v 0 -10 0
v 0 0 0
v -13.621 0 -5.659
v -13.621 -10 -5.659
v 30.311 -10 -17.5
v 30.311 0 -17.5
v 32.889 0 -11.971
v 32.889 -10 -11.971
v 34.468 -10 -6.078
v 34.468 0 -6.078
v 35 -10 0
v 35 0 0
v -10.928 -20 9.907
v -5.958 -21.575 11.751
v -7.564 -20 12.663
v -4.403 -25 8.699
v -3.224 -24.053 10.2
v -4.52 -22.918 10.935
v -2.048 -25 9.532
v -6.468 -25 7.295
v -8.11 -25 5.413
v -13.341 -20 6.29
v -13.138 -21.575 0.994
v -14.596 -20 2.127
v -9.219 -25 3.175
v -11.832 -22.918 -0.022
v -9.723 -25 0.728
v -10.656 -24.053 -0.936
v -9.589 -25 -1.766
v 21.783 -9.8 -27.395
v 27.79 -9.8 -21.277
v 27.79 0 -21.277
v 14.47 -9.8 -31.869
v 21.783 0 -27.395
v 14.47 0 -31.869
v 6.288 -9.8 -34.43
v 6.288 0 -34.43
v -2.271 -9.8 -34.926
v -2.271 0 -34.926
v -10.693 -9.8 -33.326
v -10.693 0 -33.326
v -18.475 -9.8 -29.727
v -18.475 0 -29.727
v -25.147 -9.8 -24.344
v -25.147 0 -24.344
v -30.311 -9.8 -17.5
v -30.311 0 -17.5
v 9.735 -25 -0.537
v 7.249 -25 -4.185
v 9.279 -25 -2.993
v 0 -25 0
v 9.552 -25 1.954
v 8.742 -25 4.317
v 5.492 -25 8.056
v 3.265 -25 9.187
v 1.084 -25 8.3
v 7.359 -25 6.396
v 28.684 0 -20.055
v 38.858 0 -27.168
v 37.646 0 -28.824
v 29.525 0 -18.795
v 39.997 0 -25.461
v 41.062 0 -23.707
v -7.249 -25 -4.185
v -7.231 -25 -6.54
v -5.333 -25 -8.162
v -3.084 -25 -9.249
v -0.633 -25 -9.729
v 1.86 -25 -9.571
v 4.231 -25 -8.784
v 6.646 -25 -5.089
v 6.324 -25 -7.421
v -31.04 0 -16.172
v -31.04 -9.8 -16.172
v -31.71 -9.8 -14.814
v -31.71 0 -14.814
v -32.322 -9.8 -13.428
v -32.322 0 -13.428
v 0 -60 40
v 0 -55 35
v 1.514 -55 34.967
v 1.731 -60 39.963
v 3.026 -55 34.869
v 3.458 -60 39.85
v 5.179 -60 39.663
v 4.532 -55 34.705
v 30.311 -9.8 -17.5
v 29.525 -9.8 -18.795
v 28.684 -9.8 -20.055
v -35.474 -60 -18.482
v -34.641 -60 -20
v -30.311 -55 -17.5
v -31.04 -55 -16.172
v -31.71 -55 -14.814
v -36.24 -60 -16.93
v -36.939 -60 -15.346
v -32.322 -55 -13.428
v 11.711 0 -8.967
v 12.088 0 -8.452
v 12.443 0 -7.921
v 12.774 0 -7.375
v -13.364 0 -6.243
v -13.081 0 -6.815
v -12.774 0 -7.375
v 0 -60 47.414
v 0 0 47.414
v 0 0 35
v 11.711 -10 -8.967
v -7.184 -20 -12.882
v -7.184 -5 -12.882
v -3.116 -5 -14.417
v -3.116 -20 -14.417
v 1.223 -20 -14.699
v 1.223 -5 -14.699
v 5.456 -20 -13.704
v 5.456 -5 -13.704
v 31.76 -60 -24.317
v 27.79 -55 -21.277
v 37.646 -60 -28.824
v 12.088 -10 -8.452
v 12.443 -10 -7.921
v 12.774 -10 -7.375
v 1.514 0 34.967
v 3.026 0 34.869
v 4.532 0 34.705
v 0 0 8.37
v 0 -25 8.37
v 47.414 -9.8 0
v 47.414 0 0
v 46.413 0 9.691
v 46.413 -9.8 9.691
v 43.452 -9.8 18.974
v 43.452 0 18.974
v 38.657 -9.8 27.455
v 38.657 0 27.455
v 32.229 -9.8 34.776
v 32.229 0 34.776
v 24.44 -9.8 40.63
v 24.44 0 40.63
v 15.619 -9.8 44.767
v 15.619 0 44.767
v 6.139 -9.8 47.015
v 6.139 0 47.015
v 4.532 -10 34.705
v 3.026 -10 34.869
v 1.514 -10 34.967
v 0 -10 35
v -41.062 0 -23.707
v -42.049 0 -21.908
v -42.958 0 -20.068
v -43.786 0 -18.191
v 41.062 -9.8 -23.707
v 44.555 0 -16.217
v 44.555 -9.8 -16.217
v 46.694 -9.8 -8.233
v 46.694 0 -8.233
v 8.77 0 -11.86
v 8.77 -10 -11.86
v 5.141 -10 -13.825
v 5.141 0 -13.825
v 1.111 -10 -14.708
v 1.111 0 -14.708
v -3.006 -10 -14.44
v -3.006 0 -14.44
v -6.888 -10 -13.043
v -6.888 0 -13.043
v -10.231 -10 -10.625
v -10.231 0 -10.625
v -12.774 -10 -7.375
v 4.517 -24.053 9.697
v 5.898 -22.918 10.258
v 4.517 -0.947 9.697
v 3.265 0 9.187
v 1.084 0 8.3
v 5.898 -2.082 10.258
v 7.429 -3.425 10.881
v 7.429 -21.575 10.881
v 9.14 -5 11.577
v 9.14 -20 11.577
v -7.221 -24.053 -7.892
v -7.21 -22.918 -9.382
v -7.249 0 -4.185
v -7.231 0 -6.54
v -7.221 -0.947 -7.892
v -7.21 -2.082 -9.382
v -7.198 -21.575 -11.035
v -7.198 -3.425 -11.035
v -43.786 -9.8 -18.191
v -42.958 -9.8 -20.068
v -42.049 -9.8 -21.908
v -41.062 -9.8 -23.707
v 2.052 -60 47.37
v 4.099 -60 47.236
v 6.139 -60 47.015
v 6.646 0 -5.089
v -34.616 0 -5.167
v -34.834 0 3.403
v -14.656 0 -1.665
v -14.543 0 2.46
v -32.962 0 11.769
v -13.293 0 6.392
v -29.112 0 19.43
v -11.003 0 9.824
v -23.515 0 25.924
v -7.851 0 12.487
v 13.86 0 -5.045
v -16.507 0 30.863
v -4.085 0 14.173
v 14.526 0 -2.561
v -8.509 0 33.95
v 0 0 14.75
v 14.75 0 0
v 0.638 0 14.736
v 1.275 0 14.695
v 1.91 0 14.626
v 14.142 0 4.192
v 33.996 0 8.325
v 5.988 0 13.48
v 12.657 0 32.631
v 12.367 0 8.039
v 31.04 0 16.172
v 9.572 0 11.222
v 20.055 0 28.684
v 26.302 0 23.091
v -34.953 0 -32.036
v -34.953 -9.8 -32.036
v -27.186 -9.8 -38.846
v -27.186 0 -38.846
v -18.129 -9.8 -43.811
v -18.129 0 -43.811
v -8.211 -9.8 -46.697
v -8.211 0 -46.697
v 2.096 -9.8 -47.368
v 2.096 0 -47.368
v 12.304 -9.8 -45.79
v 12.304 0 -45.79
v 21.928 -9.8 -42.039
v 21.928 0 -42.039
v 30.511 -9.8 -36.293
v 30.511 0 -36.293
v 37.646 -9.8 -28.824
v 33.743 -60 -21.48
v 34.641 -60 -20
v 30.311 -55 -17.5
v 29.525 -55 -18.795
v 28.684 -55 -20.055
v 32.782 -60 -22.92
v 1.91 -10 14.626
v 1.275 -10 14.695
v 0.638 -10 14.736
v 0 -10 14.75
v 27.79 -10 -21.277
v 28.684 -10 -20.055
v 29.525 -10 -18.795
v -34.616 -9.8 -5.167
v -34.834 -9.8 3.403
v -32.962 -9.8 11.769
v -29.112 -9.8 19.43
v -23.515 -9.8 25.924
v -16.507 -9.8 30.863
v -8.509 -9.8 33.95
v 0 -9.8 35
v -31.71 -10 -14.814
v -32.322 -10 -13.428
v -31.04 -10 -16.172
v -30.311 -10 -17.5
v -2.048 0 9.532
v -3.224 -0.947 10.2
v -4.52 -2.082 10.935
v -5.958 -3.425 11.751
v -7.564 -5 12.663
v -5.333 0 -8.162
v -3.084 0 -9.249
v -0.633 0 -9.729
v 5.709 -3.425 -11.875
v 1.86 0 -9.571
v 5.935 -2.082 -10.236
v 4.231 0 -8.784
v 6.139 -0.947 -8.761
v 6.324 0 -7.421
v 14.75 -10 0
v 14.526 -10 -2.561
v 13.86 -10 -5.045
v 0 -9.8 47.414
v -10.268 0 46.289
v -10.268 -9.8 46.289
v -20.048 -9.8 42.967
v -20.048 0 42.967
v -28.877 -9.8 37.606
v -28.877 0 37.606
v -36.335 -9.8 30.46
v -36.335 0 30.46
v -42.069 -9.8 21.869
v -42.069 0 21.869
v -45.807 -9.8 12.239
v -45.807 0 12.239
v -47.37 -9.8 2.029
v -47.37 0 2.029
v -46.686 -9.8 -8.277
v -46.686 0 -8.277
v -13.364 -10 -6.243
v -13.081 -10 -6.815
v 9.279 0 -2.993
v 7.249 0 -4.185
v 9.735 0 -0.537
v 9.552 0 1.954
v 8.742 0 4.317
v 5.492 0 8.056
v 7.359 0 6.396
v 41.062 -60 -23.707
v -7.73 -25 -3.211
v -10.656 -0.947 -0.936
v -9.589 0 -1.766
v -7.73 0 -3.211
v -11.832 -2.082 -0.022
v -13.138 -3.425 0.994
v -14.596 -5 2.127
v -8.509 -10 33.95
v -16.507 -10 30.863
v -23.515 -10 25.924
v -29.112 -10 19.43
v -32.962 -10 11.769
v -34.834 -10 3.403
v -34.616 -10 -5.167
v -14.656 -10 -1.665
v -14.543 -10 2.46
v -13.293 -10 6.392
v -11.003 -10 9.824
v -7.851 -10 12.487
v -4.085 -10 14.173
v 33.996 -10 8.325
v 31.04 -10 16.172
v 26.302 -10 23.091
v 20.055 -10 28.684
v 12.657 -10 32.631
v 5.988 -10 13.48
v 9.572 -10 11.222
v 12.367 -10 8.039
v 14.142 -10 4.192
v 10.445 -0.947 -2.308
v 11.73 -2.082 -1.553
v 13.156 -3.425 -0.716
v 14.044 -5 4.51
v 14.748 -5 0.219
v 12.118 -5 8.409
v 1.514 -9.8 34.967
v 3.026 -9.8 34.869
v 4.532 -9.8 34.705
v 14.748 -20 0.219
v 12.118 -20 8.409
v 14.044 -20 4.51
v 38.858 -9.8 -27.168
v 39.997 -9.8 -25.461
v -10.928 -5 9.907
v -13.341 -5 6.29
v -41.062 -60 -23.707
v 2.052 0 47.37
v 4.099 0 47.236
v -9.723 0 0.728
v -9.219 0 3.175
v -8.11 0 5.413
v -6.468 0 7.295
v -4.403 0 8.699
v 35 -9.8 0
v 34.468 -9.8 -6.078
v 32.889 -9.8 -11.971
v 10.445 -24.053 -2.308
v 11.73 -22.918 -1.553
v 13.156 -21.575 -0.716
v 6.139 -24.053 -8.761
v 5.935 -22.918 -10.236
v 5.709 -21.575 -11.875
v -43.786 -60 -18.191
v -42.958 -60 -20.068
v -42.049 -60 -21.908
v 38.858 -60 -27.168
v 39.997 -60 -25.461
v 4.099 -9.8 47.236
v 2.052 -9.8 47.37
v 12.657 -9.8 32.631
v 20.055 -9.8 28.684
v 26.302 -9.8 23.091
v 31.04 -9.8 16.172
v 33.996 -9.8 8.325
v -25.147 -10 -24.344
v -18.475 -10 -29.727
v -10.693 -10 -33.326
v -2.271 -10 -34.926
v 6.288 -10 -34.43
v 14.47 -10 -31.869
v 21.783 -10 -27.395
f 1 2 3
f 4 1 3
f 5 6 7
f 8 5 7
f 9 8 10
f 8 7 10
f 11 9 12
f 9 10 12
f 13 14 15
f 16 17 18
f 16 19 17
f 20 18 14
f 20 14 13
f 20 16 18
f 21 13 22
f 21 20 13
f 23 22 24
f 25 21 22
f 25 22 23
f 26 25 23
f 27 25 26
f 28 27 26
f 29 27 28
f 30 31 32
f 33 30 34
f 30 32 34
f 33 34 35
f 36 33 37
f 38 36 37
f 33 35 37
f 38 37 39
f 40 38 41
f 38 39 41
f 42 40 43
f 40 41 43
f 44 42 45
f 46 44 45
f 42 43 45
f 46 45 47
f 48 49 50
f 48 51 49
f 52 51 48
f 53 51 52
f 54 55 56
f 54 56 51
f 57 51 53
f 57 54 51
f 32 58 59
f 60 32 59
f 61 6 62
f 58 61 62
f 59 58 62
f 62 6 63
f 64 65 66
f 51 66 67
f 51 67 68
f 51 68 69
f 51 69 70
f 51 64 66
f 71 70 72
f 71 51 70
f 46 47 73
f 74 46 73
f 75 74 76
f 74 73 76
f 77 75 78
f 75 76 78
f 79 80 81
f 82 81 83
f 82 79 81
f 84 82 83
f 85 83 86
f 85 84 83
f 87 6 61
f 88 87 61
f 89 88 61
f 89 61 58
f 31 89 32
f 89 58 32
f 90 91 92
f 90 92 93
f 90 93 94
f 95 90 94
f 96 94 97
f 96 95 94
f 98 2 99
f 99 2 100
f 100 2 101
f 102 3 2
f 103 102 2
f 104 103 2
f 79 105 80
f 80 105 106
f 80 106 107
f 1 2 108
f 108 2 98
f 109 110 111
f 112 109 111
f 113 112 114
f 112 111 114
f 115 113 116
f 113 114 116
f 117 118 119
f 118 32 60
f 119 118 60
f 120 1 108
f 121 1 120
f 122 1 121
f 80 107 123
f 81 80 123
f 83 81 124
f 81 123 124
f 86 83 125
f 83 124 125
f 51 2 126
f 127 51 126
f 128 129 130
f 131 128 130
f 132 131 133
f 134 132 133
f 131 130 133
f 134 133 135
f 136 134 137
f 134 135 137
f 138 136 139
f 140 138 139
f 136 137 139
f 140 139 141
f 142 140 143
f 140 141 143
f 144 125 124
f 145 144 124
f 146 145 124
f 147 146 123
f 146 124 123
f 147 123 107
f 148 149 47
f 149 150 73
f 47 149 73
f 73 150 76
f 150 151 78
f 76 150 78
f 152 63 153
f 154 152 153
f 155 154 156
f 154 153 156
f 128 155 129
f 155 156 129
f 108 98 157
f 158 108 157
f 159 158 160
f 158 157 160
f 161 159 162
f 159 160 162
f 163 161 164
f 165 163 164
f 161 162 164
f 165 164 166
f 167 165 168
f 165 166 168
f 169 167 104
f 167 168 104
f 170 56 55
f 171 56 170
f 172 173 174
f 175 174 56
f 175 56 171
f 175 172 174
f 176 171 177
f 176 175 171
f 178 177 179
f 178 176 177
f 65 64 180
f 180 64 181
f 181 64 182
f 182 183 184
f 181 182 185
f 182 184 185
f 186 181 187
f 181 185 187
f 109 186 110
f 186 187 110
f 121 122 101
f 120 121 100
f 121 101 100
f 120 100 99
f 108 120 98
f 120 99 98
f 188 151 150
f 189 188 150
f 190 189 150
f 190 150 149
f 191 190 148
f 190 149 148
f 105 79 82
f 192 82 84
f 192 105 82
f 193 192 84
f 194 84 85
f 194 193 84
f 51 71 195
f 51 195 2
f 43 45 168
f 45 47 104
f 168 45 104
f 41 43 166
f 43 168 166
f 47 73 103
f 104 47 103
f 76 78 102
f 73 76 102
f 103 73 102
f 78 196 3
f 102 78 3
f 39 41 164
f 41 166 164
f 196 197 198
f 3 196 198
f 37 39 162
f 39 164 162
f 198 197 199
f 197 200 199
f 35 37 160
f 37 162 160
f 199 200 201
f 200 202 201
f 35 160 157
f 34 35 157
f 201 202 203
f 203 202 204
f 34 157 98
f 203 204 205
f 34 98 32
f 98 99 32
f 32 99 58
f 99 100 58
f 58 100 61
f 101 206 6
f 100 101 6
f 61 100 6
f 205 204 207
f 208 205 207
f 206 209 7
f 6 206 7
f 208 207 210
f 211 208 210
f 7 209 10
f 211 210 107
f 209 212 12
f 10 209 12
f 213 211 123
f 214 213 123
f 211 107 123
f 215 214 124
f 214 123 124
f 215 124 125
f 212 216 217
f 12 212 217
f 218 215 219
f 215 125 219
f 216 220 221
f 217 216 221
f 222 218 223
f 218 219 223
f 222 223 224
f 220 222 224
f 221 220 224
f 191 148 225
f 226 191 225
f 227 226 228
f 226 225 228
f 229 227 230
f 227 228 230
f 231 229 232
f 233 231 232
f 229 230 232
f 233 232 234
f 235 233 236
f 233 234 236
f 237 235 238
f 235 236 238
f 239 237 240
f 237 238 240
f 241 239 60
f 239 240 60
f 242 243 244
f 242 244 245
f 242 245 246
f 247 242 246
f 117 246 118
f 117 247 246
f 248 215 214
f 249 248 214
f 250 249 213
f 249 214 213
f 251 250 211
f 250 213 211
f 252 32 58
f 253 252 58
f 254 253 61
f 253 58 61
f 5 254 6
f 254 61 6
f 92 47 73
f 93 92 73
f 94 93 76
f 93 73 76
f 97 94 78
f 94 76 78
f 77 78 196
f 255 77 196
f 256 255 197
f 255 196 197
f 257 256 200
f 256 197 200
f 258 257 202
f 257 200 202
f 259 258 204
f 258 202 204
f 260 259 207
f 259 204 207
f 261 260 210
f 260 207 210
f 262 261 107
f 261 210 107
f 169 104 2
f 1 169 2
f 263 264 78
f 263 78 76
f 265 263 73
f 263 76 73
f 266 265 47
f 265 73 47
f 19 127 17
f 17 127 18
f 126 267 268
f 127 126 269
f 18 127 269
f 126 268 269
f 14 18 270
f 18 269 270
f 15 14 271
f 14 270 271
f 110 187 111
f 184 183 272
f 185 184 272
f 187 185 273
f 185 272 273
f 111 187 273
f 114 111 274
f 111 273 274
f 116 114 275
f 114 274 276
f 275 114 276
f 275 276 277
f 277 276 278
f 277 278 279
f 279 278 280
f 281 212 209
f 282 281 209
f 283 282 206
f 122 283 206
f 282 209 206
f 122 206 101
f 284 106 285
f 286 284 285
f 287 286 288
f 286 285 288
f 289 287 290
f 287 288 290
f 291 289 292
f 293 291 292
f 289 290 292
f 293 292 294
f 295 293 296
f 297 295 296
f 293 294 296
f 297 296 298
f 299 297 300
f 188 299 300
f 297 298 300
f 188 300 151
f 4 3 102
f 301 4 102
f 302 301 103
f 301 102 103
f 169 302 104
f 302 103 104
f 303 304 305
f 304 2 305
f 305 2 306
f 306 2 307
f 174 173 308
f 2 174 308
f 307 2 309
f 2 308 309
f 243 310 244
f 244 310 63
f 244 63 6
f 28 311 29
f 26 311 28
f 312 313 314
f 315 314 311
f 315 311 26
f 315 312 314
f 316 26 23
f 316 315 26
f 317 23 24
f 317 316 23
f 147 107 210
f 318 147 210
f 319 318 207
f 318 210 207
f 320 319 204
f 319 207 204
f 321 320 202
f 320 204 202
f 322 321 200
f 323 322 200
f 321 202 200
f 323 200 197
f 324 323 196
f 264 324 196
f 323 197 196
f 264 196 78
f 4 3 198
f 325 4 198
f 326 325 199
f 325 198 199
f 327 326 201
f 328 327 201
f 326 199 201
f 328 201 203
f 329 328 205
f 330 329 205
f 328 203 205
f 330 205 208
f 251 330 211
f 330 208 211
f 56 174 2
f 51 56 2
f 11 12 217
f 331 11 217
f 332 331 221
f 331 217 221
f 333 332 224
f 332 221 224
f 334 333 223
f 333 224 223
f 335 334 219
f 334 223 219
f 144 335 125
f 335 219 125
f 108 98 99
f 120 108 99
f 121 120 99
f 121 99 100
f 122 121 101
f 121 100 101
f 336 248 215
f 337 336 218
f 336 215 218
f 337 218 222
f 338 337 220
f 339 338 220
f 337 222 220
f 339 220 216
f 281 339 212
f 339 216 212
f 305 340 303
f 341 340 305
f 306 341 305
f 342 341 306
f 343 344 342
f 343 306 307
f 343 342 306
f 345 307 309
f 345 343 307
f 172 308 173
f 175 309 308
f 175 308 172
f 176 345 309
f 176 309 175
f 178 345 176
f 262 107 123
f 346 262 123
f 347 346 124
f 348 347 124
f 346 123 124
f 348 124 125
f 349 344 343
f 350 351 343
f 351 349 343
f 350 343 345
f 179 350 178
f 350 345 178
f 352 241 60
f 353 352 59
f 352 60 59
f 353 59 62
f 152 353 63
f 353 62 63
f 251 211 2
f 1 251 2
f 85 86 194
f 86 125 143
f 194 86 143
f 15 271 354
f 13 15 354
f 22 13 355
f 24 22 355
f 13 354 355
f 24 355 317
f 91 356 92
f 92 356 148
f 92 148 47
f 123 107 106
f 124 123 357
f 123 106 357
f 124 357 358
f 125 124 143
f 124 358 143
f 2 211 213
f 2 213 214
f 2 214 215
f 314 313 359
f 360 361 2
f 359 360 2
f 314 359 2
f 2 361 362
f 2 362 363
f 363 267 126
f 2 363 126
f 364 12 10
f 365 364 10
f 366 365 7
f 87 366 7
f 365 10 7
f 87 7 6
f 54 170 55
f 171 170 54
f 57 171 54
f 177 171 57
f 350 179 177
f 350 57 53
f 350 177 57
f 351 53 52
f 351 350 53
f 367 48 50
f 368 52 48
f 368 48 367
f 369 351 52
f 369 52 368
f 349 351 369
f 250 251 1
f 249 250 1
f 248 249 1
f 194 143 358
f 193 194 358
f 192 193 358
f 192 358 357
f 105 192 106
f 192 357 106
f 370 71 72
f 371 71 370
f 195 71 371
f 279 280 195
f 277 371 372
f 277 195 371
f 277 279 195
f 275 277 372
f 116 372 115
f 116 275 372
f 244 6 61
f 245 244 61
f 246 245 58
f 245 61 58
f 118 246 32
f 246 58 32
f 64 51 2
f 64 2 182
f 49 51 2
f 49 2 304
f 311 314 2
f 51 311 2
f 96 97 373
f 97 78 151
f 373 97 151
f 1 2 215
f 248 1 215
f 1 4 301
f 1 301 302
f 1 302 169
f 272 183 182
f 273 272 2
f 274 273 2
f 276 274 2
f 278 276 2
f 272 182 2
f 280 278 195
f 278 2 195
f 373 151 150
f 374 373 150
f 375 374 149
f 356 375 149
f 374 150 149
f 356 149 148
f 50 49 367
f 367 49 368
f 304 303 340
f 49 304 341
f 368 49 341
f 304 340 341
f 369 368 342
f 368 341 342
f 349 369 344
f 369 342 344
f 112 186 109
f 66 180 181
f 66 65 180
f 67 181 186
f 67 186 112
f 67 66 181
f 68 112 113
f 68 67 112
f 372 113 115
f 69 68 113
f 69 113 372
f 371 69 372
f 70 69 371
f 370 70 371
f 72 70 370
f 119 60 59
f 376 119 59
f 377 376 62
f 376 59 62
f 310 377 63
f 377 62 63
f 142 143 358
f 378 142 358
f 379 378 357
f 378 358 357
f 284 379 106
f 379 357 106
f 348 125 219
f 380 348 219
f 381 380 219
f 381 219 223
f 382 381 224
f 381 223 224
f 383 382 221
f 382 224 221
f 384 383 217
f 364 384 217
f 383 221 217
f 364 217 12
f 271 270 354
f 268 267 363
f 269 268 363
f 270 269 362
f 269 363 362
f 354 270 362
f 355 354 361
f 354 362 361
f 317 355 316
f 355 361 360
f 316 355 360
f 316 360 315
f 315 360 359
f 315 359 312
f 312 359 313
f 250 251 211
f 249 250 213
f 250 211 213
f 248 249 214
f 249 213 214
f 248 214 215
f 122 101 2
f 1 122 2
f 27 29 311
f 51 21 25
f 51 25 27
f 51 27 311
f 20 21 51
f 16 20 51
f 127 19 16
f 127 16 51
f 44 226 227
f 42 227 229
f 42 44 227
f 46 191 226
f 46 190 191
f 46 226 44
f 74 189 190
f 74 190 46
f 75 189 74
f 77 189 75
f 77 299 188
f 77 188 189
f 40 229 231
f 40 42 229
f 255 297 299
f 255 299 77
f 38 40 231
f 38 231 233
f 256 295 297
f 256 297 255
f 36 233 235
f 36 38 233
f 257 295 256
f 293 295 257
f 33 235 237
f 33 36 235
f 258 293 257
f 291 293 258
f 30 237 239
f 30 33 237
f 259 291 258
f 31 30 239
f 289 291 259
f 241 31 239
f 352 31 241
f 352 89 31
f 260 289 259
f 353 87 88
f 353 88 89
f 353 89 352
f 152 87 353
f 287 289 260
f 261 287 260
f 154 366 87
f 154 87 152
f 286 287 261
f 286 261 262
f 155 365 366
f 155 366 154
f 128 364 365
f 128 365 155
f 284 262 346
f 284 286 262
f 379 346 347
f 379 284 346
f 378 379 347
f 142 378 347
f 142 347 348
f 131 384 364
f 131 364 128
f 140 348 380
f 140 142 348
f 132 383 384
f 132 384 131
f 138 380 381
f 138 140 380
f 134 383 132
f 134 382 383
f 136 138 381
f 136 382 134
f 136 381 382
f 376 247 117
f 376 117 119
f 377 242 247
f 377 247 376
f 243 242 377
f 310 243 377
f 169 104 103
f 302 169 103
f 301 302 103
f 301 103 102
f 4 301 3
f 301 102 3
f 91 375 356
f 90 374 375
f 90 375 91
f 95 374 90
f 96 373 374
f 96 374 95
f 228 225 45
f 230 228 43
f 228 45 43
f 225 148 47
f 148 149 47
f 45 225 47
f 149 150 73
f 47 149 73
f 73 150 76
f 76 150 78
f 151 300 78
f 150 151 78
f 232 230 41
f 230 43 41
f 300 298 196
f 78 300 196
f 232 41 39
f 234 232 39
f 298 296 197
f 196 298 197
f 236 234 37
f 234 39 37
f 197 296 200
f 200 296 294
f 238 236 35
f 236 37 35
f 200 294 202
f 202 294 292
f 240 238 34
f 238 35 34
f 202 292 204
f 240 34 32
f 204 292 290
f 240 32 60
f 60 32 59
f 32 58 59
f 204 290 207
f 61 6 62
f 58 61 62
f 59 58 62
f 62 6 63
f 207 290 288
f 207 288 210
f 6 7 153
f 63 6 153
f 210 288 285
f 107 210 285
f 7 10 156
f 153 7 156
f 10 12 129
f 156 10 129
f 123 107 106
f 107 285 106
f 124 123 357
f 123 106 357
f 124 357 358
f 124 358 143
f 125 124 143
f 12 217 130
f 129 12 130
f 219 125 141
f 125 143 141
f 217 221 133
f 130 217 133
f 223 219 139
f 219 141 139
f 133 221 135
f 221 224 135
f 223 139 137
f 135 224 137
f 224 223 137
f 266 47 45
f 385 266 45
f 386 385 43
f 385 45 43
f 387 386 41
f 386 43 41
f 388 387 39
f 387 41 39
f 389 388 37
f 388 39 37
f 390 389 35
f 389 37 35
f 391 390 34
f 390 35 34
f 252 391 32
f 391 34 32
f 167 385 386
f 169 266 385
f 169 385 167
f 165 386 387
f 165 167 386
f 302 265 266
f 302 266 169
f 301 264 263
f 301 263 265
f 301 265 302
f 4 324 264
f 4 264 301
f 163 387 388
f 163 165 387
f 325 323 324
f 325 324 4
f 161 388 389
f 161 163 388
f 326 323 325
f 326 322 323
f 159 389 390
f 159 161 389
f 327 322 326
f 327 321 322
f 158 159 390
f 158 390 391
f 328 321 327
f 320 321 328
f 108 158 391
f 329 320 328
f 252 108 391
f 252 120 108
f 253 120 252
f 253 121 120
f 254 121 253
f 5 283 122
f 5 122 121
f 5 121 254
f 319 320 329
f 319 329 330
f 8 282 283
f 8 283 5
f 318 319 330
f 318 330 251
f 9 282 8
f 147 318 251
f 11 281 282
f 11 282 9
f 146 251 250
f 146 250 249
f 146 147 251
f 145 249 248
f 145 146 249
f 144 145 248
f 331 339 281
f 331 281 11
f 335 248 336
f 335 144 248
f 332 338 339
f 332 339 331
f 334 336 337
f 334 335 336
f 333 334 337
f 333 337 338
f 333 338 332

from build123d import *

# Parameters (mm, degrees)
F1_DEPTH      = 60
F2_DEPTH      = 9.8
F3_DEPTH      = 25
F4_DEPTH      = 10
F5_DEPTH      = 10
F6_T1_DEPTH   = 64.9472775058
F6_T4_ANGLE   = 212.5191011757
F6_T6_ANGLE   = 212.5191011757
F6_2_T1_DEPTH = 64.9472775058
F6_2_T4_ANGLE = 212.5191011757
F6_2_T6_ANGLE = 212.5191011757
F6_3_T1_DEPTH = 64.9472775058
F6_3_T4_ANGLE = 212.5191011757
F6_3_T6_ANGLE = 212.5191011757
F7_SIZE       = 5
F7_2_SIZE     = 5
F7_3_SIZE     = 5


# Not quite as in the source:
# - a fillet or chamfer that OpenCascade refuses, or shapes differently, is made with other operations: its cross-section is extruded or revolved along the edge and cut away or added


with BuildPart() as f1:
    # F0 (on Front) → F1 (new body)
    with BuildSketch(Plane.XZ):
        with BuildLine():
            ThreePointArc((0, 35), (2.2707204157, 34.9262627373), (4.5318730195, 34.7053616454))
            Line((4.5318730195, 34.7053616454), (6.1392555161, 47.0147954288))
            ThreePointArc((6.1392555161, 47.0147954288), (3.0761084385, 47.3140465864), (0, 47.4139372706))
            Line((0, 47.4139372706), (0, 35))
        make_face()
    extrude(amount=F1_DEPTH)

    # F7
    f7_edges = [f1.edges().sort_by_distance(p)[0] for p in [
        (2.27072, -60, 34.926263),
    ]]
    chamfer(f7_edges, length=F7_SIZE)


with BuildPart() as f1b:
    # F0 (on Front) → F1, piece 2 (new body)
    with BuildSketch(Plane.XZ):
        with BuildLine():
            Line((41.0616741698, -23.7069686353), (30.3108891325, -17.5))
            ThreePointArc((30.3108891325, -17.5), (29.1116705819, -19.4296329335), (27.7897883227, -21.2773979843))
            Line((27.7897883227, -21.2773979843), (37.646379437, -28.8241489517))
            ThreePointArc((37.646379437, -28.8241489517), (39.4371120804, -26.3210113457), (41.0616741698, -23.7069686353))
        make_face()
    extrude(amount=F1_DEPTH)

    # F7#2
    f7_2_edges = [f1b.edges().sort_by_distance(p)[0] for p in [
        (29.111671, -60, -19.429633),
    ]]
    chamfer(f7_2_edges, length=F7_2_SIZE)


with BuildPart() as f1c:
    # F0 (on Front) → F1, piece 3 (new body)
    with BuildSketch(Plane.XZ):
        with BuildLine():
            ThreePointArc((-30.3108891325, -17.5), (-31.3823909976, -15.4966298038), (-32.3216613422, -13.4279636611))
            Line((-32.3216613422, -13.4279636611), (-43.7856349531, -18.1906464771))
            ThreePointArc((-43.7856349531, -18.1906464771), (-42.5132205189, -20.9930352406), (-41.0616741698, -23.7069686353))
            Line((-41.0616741698, -23.7069686353), (-30.3108891325, -17.5))
        make_face()
    extrude(amount=F1_DEPTH)

    # F7#3
    f7_3_edges = [f1c.edges().sort_by_distance(p)[0] for p in [
        (-31.382391, -60, -15.49663),
    ]]
    chamfer(f7_3_edges, length=F7_3_SIZE)


with BuildPart() as f2:
    # F0 (on Front) → F2 (new body)
    with BuildSketch(Plane.XZ):
        with BuildLine():
            ThreePointArc((4.5318730195, 34.7053616454), (26.3022390271, 23.0909554189), (35, 0))
            ThreePointArc((35, 0), (33.8074039201, -9.0586665786), (30.3108891325, -17.5))
            Line((30.3108891325, -17.5), (41.0616741698, -23.7069686353))
            ThreePointArc((41.0616741698, -23.7069686353), (45.7983465358, -12.2716299689), (47.4139372706, 0))
            ThreePointArc((47.4139372706, 0), (35.6312203232, 31.2809460501), (6.1392555161, 47.0147954288))
            Line((6.1392555161, 47.0147954288), (4.5318730195, 34.7053616454))
        make_face()
        with BuildLine():
            ThreePointArc((0, 35), (2.2707204157, 34.9262627373), (4.5318730195, 34.7053616454))
            Line((4.5318730195, 34.7053616454), (6.1392555161, 47.0147954288))
            ThreePointArc((6.1392555161, 47.0147954288), (3.0761084385, 47.3140465864), (0, 47.4139372706))
            Line((0, 47.4139372706), (0, 35))
        make_face()
        with BuildLine():
            Line((41.0616741698, -23.7069686353), (30.3108891325, -17.5))
            ThreePointArc((30.3108891325, -17.5), (29.1116705819, -19.4296329335), (27.7897883227, -21.2773979843))
            Line((27.7897883227, -21.2773979843), (37.646379437, -28.8241489517))
            ThreePointArc((37.646379437, -28.8241489517), (39.4371120804, -26.3210113457), (41.0616741698, -23.7069686353))
        make_face()
        with BuildLine():
            ThreePointArc((-32.3216613422, -13.4279636611), (-29.1116705819, 19.4296329335), (0, 35))
            Line((0, 35), (0, 47.4139372706))
            ThreePointArc((0, 47.4139372706), (-39.4371120804, 26.3210113457), (-43.7856349531, -18.1906464771))
            Line((-43.7856349531, -18.1906464771), (-32.3216613422, -13.4279636611))
        make_face()
        with BuildLine():
            Line((37.646379437, -28.8241489517), (27.7897883227, -21.2773979843))
            ThreePointArc((27.7897883227, -21.2773979843), (-2.2707204157, -34.9262627373), (-30.3108891325, -17.5))
            Line((-30.3108891325, -17.5), (-41.0616741698, -23.7069686353))
            ThreePointArc((-41.0616741698, -23.7069686353), (-3.0761084385, -47.3140465864), (37.646379437, -28.8241489517))
        make_face()
        with BuildLine():
            ThreePointArc((-30.3108891325, -17.5), (-31.3823909976, -15.4966298038), (-32.3216613422, -13.4279636611))
            Line((-32.3216613422, -13.4279636611), (-43.7856349531, -18.1906464771))
            ThreePointArc((-43.7856349531, -18.1906464771), (-42.5132205189, -20.9930352406), (-41.0616741698, -23.7069686353))
            Line((-41.0616741698, -23.7069686353), (-30.3108891325, -17.5))
        make_face()
    extrude(amount=F2_DEPTH)


with BuildPart() as f3:
    # F0 (on Front) → F3 (new body)
    with BuildSketch(Plane.XZ):
        with BuildLine():
            Line((0, 0), (0, 14.75))
            ThreePointArc((0, 14.75), (-12.2684897452, 8.1882024506), (-13.6212715656, -5.6589275429))
            Line((-13.6212715656, -5.6589275429), (0, 0))
        make_face()
    extrude(amount=F3_DEPTH)

    # F6: chamfer of 5 on 4 edges, made by hand

    # F6_s2 → F6_t1 (cut)
    with BuildSketch(Plane.XZ.offset(-19.9736387529)):
        with BuildLine():
            Line((0, 8.3703345214), (-7.5641025641, 12.6628137631))
            ThreePointArc((-7.5641025641, 12.6628137631), (-3.9937030678, 14.1990434821), (0, 14.75))
            Line((0, 14.75), (0, 8.3703345214))
        make_face()
        with BuildLine():
            Line((-7.7298033635, -3.2113299367), (-14.5958192129, 2.1271016679))
            ThreePointArc((-14.5958192129, 2.1271016679), (-14.6446849851, -1.759460624), (-13.6212715656, -5.6589275429))
            Line((-13.6212715656, -5.6589275429), (-7.7298033635, -3.2113299367))
        make_face()
    extrude(amount=F6_T1_DEPTH, mode=Mode.SUBTRACT)

    # F6_s3 → F6_t4 (revolve, cut)
    with BuildSketch(Plane(origin=(0, 0, 0), x_dir=(0, 1, 0), z_dir=(0.6430632155, 0, -0.7658130979))):
        Polygon((-5, 14.75), (0, 9.75), (0, 14.75), align=None)
    revolve(axis=Axis((0, 0, 0), (0, -1, 0)), revolution_arc=F6_T4_ANGLE, mode=Mode.SUBTRACT)

    # F6_s5 → F6_t6 (revolve, cut)
    with BuildSketch(Plane(origin=(0, 0, 0), x_dir=(0, 1, 0), z_dir=(0.6430632155, 0, -0.7658130979))):
        Polygon((-20, 14.75), (-25, 9.75), (-25, 14.75), align=None)
    revolve(axis=Axis((0, -25, 0), (0, -1, 0)), revolution_arc=F6_T6_ANGLE, mode=Mode.SUBTRACT)


with BuildPart() as f3b:
    # F0 (on Front) → F3, piece 2 (new body)
    with BuildSketch(Plane.XZ):
        with BuildLine():
            ThreePointArc((14.75, 0), (11.0845150186, 9.7311883551), (1.9098607725, 14.6258309791))
            Line((1.9098607725, 14.6258309791), (0, 0))
            Line((0, 0), (12.7738747058, -7.375))
            ThreePointArc((12.7738747058, -7.375), (14.2474059378, -3.8175809153), (14.75, 0))
        make_face()
    extrude(amount=F3_DEPTH)

    # F6#2: chamfer of 5 on 4 edges, made by hand

    # F6_2_s2 → F6_2_t1 (cut)
    with BuildSketch(Plane.XZ.offset(-19.9736387529)):
        with BuildLine():
            Line((7.2489223337, -4.1851672607), (14.7483696843, 0.2192980958))
            ThreePointArc((14.7483696843, 0.2192980958), (14.2935838988, -3.6408734291), (12.7738747058, -7.375))
            Line((12.7738747058, -7.375), (7.2489223337, -4.1851672607))
        make_face()
        with BuildLine():
            Line((1.0838083766, 8.2998710474), (9.1400336873, 11.5767993934))
            ThreePointArc((9.1400336873, 11.5767993934), (5.7986048952, 13.5623995395), (1.9098607725, 14.6258309791))
            Line((1.9098607725, 14.6258309791), (1.0838083766, 8.2998710474))
        make_face()
    extrude(amount=F6_2_T1_DEPTH, mode=Mode.SUBTRACT)

    # F6_2_s3 → F6_2_t4 (revolve, cut)
    with BuildSketch(Plane(origin=(0, 0, 0), x_dir=(0, 1, 0), z_dir=(-0.7368088334, 0, -0.6761011337))):
        Polygon((-25, -9.75), (-20, -14.75), (-25, -14.75), align=None)
    revolve(axis=Axis((0, -25, 0), (0, 1, 0)), revolution_arc=F6_2_T4_ANGLE, mode=Mode.SUBTRACT)

    # F6_2_s5 → F6_2_t6 (revolve, cut)
    with BuildSketch(Plane(origin=(0, 0, 0), x_dir=(0, 1, 0), z_dir=(-0.9847452051, 0, -0.1740025319))):
        Polygon((0, 9.75), (-5, 14.75), (0, 14.75), align=None)
    revolve(axis=Axis((0, 0, 0), (0, -1, 0)), revolution_arc=F6_2_T6_ANGLE, mode=Mode.SUBTRACT)


with BuildPart() as f3c:
    # F0 (on Front) → F3, piece 3 (new body)
    with BuildSketch(Plane.XZ):
        with BuildLine():
            Line((11.7114107931, -8.9669034362), (0, 0))
            Line((0, 0), (-12.7738747058, -7.375))
            ThreePointArc((-12.7738747058, -7.375), (-0.9569464609, -14.7189250107), (11.7114107931, -8.9669034362))
        make_face()
    extrude(amount=F3_DEPTH)

    # F6#3: chamfer of 5 on 4 edges, made by hand

    # F6_3_s2 → F6_3_t1 (cut)
    with BuildSketch(Plane.XZ.offset(-19.9736387529)):
        with BuildLine():
            Line((-7.2489223337, -4.1851672607), (-7.1842671202, -12.8821118589))
            ThreePointArc((-7.1842671202, -12.8821118589), (-10.299880831, -10.558170053), (-12.7738747058, -7.375))
            Line((-12.7738747058, -7.375), (-7.2489223337, -4.1851672607))
        make_face()
        with BuildLine():
            Line((6.6459949868, -5.0885411107), (5.4557855256, -13.7039010613))
            ThreePointArc((5.4557855256, -13.7039010613), (8.8460800899, -11.8029389155), (11.7114107931, -8.9669034362))
            Line((11.7114107931, -8.9669034362), (6.6459949868, -5.0885411107))
        make_face()
    extrude(amount=F6_3_T1_DEPTH, mode=Mode.SUBTRACT)

    # F6_3_s3 → F6_3_t4 (revolve, cut)
    with BuildSketch(Plane(origin=(0, 0, 0), x_dir=(0, 1, 0), z_dir=(0.3416819896, 0, 0.9398156298))):
        Polygon((-20, 14.75), (-25, 9.75), (-25, 14.75), align=None)
    revolve(axis=Axis((0, -25, 0), (0, -1, 0)), revolution_arc=F6_3_T4_ANGLE, mode=Mode.SUBTRACT)

    # F6_3_s5 → F6_3_t6 (revolve, cut)
    with BuildSketch(Plane(origin=(0, 0, 0), x_dir=(0, 1, 0), z_dir=(0.3416819896, 0, 0.9398156298))):
        Polygon((-5, 14.75), (0, 9.75), (0, 14.75), align=None)
    revolve(axis=Axis((0, 0, 0), (0, -1, 0)), revolution_arc=F6_3_T6_ANGLE, mode=Mode.SUBTRACT)


with BuildPart() as f4:
    # F0 (on Front) → F4 (new body)
    with BuildSketch(Plane.XZ):
        with BuildLine():
            ThreePointArc((-30.3108891325, -17.5), (-2.2707204157, -34.9262627373), (27.7897883227, -21.2773979843))
            Line((27.7897883227, -21.2773979843), (11.7114107931, -8.9669034362))
            ThreePointArc((11.7114107931, -8.9669034362), (-0.9569464609, -14.7189250107), (-12.7738747058, -7.375))
            Line((-12.7738747058, -7.375), (-30.3108891325, -17.5))
        make_face()
        with BuildLine():
            ThreePointArc((30.3108891325, -17.5), (33.8074039201, -9.0586665786), (35, 0))
            ThreePointArc((35, 0), (26.3022390271, 23.0909554189), (4.5318730195, 34.7053616454))
            Line((4.5318730195, 34.7053616454), (1.9098607725, 14.6258309791))
            ThreePointArc((1.9098607725, 14.6258309791), (11.0845150186, 9.7311883551), (14.75, 0))
            ThreePointArc((14.75, 0), (14.2474059378, -3.8175809153), (12.7738747058, -7.375))
            Line((12.7738747058, -7.375), (30.3108891325, -17.5))
        make_face()
        with BuildLine():
            ThreePointArc((27.7897883227, -21.2773979843), (29.1116705819, -19.4296329335), (30.3108891325, -17.5))
            Line((30.3108891325, -17.5), (12.7738747058, -7.375))
            ThreePointArc((12.7738747058, -7.375), (12.2684897452, -8.1882024506), (11.7114107931, -8.9669034362))
            Line((11.7114107931, -8.9669034362), (27.7897883227, -21.2773979843))
        make_face()
        with BuildLine():
            Line((-13.6212715656, -5.6589275429), (-32.3216613422, -13.4279636611))
            ThreePointArc((-32.3216613422, -13.4279636611), (-31.3823909976, -15.4966298038), (-30.3108891325, -17.5))
            Line((-30.3108891325, -17.5), (-12.7738747058, -7.375))
            ThreePointArc((-12.7738747058, -7.375), (-13.2254362061, -6.5307225602), (-13.6212715656, -5.6589275429))
        make_face()
        with BuildLine():
            Line((0, 14.75), (0, 35))
            ThreePointArc((0, 35), (-29.1116705819, 19.4296329335), (-32.3216613422, -13.4279636611))
            Line((-32.3216613422, -13.4279636611), (-13.6212715656, -5.6589275429))
            ThreePointArc((-13.6212715656, -5.6589275429), (-12.2684897452, 8.1882024506), (0, 14.75))
        make_face()
        with BuildLine():
            Line((1.9098607725, 14.6258309791), (4.5318730195, 34.7053616454))
            ThreePointArc((4.5318730195, 34.7053616454), (2.2707204157, 34.9262627373), (0, 35))
            Line((0, 35), (0, 14.75))
            ThreePointArc((0, 14.75), (0.9569464609, 14.7189250107), (1.9098607725, 14.6258309791))
        make_face()
    extrude(amount=F4_DEPTH)


with BuildPart() as f5:
    # F0 (on Front) → F5 (new body)
    with BuildSketch(Plane.XZ):
        with BuildLine():
            ThreePointArc((11.7114107931, -8.9669034362), (12.2684897452, -8.1882024506), (12.7738747058, -7.375))
            Line((12.7738747058, -7.375), (0, 0))
            Line((0, 0), (11.7114107931, -8.9669034362))
        make_face()
    extrude(amount=F5_DEPTH)


with BuildPart() as f5b:
    # F0 (on Front) → F5, piece 2 (new body)
    with BuildSketch(Plane.XZ):
        with BuildLine():
            Line((-12.7738747058, -7.375), (0, 0))
            Line((0, 0), (-13.6212715656, -5.6589275429))
            ThreePointArc((-13.6212715656, -5.6589275429), (-13.2254362061, -6.5307225602), (-12.7738747058, -7.375))
        make_face()
    extrude(amount=F5_DEPTH)


with BuildPart() as f5c:
    # F0 (on Front) → F5, piece 3 (new body)
    with BuildSketch(Plane.XZ):
        with BuildLine():
            Line((0, 0), (1.9098607725, 14.6258309791))
            ThreePointArc((1.9098607725, 14.6258309791), (0.9569464609, 14.7189250107), (0, 14.75))
            Line((0, 14.75), (0, 0))
        make_face()
    extrude(amount=F5_DEPTH)


solid = Compound([f1.part, f1b.part, f1c.part, f2.part, f3.part, f3b.part, f3c.part, f4.part, f5.part, f5b.part, f5c.part])
